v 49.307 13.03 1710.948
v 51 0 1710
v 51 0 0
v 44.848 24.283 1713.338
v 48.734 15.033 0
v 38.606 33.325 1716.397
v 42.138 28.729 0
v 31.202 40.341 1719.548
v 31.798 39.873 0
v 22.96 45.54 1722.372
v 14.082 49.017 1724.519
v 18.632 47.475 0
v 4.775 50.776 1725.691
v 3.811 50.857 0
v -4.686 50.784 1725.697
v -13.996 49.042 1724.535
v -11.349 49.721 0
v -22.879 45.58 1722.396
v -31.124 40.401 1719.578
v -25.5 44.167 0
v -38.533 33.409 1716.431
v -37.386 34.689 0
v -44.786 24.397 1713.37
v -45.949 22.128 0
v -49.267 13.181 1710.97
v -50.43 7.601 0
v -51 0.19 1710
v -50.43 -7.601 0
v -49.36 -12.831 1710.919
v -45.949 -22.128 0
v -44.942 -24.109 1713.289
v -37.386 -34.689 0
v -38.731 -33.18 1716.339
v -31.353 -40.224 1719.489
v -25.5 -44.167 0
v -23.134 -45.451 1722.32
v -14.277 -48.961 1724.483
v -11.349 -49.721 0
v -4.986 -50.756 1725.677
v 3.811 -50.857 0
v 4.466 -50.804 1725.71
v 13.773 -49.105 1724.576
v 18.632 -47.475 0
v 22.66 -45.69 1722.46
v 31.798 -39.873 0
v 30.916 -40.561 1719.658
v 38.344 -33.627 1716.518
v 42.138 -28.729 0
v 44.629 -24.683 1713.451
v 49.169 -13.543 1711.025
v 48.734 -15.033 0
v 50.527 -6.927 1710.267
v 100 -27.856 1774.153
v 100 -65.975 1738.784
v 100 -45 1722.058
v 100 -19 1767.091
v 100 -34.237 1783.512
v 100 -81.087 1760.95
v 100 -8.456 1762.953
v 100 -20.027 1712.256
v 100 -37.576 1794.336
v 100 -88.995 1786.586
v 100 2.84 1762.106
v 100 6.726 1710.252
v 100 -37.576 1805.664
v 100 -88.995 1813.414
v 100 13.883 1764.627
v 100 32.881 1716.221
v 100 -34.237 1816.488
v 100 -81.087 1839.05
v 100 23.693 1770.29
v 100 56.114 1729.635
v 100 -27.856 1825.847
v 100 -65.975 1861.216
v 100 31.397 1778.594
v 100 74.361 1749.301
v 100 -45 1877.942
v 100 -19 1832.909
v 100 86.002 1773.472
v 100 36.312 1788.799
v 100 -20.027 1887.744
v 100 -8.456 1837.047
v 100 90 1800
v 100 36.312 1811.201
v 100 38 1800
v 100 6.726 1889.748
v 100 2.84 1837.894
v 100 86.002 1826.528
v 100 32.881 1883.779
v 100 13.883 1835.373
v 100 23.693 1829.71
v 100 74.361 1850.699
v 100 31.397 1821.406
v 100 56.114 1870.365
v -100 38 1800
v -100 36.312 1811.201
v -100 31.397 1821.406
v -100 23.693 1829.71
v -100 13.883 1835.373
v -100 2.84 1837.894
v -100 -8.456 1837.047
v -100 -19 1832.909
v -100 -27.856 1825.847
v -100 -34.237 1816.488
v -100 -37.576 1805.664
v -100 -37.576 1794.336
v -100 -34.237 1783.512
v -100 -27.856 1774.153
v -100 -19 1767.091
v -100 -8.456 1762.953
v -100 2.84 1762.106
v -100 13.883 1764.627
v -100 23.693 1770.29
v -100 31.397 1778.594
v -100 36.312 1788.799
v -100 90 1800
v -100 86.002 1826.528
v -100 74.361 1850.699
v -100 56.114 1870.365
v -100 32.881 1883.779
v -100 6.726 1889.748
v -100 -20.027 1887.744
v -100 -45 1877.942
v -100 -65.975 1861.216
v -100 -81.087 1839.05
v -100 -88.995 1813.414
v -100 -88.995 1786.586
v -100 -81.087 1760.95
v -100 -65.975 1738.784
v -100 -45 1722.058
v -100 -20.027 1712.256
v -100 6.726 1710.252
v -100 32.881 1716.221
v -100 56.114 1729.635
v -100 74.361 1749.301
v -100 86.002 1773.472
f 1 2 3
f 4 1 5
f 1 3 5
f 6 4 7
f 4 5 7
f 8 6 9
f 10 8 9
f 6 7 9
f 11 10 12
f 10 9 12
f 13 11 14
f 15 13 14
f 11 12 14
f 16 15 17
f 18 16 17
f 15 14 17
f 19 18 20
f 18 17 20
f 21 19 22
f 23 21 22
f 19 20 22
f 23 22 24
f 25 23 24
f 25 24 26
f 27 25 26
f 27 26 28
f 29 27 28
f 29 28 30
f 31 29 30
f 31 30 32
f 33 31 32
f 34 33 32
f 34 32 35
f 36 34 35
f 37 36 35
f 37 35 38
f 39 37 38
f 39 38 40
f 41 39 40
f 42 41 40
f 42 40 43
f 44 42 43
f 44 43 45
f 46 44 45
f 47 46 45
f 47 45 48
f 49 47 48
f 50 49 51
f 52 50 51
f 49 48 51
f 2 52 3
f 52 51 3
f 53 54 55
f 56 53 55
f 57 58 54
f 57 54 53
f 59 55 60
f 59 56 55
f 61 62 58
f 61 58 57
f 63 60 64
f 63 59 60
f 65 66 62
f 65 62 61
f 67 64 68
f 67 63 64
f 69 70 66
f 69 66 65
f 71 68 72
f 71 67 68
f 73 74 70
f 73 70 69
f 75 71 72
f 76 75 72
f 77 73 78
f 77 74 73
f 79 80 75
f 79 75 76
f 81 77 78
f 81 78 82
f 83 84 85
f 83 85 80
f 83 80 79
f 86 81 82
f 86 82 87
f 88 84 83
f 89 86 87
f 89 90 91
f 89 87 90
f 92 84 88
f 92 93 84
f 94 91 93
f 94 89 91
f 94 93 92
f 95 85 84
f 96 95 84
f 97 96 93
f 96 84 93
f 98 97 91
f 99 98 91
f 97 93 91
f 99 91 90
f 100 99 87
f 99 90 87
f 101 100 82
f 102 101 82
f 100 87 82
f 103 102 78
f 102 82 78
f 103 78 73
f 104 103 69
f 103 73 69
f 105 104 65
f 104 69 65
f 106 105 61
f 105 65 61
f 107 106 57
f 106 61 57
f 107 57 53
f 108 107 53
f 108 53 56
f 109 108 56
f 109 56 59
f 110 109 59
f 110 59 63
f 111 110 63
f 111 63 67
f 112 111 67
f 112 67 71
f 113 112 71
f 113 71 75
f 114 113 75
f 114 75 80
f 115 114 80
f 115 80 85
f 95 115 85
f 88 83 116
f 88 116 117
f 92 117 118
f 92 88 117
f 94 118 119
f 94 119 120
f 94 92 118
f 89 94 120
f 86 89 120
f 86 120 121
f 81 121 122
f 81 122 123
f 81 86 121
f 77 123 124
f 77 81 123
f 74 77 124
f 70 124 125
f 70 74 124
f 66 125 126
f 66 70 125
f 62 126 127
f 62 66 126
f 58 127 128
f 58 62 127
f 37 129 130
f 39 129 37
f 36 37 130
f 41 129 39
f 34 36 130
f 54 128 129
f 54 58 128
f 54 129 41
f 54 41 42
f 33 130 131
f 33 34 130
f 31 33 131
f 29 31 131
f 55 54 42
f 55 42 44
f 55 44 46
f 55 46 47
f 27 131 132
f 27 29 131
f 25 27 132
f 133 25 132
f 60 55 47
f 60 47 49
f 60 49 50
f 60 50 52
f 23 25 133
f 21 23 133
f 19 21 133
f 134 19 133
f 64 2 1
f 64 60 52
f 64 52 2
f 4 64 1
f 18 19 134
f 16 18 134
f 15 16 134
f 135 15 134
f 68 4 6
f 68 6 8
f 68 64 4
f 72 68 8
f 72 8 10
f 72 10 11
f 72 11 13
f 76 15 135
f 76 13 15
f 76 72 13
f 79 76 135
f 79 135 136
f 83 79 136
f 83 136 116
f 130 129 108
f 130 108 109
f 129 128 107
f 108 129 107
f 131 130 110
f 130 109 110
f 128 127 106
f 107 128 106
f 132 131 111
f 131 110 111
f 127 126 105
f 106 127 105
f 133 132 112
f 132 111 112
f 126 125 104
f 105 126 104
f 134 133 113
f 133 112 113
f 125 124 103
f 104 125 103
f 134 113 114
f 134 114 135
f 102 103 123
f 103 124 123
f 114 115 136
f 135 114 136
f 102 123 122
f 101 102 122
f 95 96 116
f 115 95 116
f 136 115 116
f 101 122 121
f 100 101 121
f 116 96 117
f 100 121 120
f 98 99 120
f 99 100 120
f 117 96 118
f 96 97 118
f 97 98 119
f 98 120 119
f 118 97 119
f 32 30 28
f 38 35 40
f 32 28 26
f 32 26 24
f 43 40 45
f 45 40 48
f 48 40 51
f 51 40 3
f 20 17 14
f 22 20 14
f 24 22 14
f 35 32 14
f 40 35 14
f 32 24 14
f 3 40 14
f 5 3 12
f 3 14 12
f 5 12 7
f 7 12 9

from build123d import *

# Parameters (mm, degrees)
F0_R     = 51
F1_DEPTH = 1800
F2_R     = 90
F3_DEPTH = 100
F4_R     = 38
F5_DEPTH = 200.001


with BuildPart() as f1:
    # F0 (on Top) → F1 (new body)
    with BuildSketch(Plane.XY):
        Circle(F0_R)
    extrude(amount=F1_DEPTH)

    # F2 (on Right) → F3 (join, symmetric)
    with BuildSketch(Plane.YZ):
        with Locations((0, 1800)):
            Circle(F2_R)
    extrude(amount=F3_DEPTH, both=True)

    # F4 (on face) → F5 (cut, through all)
    with BuildSketch(Plane.YZ.offset(100)):
        with Locations((0, 1800)):
            Circle(F4_R)
    extrude(amount=-F5_DEPTH, mode=Mode.SUBTRACT)


solid = f1.part
